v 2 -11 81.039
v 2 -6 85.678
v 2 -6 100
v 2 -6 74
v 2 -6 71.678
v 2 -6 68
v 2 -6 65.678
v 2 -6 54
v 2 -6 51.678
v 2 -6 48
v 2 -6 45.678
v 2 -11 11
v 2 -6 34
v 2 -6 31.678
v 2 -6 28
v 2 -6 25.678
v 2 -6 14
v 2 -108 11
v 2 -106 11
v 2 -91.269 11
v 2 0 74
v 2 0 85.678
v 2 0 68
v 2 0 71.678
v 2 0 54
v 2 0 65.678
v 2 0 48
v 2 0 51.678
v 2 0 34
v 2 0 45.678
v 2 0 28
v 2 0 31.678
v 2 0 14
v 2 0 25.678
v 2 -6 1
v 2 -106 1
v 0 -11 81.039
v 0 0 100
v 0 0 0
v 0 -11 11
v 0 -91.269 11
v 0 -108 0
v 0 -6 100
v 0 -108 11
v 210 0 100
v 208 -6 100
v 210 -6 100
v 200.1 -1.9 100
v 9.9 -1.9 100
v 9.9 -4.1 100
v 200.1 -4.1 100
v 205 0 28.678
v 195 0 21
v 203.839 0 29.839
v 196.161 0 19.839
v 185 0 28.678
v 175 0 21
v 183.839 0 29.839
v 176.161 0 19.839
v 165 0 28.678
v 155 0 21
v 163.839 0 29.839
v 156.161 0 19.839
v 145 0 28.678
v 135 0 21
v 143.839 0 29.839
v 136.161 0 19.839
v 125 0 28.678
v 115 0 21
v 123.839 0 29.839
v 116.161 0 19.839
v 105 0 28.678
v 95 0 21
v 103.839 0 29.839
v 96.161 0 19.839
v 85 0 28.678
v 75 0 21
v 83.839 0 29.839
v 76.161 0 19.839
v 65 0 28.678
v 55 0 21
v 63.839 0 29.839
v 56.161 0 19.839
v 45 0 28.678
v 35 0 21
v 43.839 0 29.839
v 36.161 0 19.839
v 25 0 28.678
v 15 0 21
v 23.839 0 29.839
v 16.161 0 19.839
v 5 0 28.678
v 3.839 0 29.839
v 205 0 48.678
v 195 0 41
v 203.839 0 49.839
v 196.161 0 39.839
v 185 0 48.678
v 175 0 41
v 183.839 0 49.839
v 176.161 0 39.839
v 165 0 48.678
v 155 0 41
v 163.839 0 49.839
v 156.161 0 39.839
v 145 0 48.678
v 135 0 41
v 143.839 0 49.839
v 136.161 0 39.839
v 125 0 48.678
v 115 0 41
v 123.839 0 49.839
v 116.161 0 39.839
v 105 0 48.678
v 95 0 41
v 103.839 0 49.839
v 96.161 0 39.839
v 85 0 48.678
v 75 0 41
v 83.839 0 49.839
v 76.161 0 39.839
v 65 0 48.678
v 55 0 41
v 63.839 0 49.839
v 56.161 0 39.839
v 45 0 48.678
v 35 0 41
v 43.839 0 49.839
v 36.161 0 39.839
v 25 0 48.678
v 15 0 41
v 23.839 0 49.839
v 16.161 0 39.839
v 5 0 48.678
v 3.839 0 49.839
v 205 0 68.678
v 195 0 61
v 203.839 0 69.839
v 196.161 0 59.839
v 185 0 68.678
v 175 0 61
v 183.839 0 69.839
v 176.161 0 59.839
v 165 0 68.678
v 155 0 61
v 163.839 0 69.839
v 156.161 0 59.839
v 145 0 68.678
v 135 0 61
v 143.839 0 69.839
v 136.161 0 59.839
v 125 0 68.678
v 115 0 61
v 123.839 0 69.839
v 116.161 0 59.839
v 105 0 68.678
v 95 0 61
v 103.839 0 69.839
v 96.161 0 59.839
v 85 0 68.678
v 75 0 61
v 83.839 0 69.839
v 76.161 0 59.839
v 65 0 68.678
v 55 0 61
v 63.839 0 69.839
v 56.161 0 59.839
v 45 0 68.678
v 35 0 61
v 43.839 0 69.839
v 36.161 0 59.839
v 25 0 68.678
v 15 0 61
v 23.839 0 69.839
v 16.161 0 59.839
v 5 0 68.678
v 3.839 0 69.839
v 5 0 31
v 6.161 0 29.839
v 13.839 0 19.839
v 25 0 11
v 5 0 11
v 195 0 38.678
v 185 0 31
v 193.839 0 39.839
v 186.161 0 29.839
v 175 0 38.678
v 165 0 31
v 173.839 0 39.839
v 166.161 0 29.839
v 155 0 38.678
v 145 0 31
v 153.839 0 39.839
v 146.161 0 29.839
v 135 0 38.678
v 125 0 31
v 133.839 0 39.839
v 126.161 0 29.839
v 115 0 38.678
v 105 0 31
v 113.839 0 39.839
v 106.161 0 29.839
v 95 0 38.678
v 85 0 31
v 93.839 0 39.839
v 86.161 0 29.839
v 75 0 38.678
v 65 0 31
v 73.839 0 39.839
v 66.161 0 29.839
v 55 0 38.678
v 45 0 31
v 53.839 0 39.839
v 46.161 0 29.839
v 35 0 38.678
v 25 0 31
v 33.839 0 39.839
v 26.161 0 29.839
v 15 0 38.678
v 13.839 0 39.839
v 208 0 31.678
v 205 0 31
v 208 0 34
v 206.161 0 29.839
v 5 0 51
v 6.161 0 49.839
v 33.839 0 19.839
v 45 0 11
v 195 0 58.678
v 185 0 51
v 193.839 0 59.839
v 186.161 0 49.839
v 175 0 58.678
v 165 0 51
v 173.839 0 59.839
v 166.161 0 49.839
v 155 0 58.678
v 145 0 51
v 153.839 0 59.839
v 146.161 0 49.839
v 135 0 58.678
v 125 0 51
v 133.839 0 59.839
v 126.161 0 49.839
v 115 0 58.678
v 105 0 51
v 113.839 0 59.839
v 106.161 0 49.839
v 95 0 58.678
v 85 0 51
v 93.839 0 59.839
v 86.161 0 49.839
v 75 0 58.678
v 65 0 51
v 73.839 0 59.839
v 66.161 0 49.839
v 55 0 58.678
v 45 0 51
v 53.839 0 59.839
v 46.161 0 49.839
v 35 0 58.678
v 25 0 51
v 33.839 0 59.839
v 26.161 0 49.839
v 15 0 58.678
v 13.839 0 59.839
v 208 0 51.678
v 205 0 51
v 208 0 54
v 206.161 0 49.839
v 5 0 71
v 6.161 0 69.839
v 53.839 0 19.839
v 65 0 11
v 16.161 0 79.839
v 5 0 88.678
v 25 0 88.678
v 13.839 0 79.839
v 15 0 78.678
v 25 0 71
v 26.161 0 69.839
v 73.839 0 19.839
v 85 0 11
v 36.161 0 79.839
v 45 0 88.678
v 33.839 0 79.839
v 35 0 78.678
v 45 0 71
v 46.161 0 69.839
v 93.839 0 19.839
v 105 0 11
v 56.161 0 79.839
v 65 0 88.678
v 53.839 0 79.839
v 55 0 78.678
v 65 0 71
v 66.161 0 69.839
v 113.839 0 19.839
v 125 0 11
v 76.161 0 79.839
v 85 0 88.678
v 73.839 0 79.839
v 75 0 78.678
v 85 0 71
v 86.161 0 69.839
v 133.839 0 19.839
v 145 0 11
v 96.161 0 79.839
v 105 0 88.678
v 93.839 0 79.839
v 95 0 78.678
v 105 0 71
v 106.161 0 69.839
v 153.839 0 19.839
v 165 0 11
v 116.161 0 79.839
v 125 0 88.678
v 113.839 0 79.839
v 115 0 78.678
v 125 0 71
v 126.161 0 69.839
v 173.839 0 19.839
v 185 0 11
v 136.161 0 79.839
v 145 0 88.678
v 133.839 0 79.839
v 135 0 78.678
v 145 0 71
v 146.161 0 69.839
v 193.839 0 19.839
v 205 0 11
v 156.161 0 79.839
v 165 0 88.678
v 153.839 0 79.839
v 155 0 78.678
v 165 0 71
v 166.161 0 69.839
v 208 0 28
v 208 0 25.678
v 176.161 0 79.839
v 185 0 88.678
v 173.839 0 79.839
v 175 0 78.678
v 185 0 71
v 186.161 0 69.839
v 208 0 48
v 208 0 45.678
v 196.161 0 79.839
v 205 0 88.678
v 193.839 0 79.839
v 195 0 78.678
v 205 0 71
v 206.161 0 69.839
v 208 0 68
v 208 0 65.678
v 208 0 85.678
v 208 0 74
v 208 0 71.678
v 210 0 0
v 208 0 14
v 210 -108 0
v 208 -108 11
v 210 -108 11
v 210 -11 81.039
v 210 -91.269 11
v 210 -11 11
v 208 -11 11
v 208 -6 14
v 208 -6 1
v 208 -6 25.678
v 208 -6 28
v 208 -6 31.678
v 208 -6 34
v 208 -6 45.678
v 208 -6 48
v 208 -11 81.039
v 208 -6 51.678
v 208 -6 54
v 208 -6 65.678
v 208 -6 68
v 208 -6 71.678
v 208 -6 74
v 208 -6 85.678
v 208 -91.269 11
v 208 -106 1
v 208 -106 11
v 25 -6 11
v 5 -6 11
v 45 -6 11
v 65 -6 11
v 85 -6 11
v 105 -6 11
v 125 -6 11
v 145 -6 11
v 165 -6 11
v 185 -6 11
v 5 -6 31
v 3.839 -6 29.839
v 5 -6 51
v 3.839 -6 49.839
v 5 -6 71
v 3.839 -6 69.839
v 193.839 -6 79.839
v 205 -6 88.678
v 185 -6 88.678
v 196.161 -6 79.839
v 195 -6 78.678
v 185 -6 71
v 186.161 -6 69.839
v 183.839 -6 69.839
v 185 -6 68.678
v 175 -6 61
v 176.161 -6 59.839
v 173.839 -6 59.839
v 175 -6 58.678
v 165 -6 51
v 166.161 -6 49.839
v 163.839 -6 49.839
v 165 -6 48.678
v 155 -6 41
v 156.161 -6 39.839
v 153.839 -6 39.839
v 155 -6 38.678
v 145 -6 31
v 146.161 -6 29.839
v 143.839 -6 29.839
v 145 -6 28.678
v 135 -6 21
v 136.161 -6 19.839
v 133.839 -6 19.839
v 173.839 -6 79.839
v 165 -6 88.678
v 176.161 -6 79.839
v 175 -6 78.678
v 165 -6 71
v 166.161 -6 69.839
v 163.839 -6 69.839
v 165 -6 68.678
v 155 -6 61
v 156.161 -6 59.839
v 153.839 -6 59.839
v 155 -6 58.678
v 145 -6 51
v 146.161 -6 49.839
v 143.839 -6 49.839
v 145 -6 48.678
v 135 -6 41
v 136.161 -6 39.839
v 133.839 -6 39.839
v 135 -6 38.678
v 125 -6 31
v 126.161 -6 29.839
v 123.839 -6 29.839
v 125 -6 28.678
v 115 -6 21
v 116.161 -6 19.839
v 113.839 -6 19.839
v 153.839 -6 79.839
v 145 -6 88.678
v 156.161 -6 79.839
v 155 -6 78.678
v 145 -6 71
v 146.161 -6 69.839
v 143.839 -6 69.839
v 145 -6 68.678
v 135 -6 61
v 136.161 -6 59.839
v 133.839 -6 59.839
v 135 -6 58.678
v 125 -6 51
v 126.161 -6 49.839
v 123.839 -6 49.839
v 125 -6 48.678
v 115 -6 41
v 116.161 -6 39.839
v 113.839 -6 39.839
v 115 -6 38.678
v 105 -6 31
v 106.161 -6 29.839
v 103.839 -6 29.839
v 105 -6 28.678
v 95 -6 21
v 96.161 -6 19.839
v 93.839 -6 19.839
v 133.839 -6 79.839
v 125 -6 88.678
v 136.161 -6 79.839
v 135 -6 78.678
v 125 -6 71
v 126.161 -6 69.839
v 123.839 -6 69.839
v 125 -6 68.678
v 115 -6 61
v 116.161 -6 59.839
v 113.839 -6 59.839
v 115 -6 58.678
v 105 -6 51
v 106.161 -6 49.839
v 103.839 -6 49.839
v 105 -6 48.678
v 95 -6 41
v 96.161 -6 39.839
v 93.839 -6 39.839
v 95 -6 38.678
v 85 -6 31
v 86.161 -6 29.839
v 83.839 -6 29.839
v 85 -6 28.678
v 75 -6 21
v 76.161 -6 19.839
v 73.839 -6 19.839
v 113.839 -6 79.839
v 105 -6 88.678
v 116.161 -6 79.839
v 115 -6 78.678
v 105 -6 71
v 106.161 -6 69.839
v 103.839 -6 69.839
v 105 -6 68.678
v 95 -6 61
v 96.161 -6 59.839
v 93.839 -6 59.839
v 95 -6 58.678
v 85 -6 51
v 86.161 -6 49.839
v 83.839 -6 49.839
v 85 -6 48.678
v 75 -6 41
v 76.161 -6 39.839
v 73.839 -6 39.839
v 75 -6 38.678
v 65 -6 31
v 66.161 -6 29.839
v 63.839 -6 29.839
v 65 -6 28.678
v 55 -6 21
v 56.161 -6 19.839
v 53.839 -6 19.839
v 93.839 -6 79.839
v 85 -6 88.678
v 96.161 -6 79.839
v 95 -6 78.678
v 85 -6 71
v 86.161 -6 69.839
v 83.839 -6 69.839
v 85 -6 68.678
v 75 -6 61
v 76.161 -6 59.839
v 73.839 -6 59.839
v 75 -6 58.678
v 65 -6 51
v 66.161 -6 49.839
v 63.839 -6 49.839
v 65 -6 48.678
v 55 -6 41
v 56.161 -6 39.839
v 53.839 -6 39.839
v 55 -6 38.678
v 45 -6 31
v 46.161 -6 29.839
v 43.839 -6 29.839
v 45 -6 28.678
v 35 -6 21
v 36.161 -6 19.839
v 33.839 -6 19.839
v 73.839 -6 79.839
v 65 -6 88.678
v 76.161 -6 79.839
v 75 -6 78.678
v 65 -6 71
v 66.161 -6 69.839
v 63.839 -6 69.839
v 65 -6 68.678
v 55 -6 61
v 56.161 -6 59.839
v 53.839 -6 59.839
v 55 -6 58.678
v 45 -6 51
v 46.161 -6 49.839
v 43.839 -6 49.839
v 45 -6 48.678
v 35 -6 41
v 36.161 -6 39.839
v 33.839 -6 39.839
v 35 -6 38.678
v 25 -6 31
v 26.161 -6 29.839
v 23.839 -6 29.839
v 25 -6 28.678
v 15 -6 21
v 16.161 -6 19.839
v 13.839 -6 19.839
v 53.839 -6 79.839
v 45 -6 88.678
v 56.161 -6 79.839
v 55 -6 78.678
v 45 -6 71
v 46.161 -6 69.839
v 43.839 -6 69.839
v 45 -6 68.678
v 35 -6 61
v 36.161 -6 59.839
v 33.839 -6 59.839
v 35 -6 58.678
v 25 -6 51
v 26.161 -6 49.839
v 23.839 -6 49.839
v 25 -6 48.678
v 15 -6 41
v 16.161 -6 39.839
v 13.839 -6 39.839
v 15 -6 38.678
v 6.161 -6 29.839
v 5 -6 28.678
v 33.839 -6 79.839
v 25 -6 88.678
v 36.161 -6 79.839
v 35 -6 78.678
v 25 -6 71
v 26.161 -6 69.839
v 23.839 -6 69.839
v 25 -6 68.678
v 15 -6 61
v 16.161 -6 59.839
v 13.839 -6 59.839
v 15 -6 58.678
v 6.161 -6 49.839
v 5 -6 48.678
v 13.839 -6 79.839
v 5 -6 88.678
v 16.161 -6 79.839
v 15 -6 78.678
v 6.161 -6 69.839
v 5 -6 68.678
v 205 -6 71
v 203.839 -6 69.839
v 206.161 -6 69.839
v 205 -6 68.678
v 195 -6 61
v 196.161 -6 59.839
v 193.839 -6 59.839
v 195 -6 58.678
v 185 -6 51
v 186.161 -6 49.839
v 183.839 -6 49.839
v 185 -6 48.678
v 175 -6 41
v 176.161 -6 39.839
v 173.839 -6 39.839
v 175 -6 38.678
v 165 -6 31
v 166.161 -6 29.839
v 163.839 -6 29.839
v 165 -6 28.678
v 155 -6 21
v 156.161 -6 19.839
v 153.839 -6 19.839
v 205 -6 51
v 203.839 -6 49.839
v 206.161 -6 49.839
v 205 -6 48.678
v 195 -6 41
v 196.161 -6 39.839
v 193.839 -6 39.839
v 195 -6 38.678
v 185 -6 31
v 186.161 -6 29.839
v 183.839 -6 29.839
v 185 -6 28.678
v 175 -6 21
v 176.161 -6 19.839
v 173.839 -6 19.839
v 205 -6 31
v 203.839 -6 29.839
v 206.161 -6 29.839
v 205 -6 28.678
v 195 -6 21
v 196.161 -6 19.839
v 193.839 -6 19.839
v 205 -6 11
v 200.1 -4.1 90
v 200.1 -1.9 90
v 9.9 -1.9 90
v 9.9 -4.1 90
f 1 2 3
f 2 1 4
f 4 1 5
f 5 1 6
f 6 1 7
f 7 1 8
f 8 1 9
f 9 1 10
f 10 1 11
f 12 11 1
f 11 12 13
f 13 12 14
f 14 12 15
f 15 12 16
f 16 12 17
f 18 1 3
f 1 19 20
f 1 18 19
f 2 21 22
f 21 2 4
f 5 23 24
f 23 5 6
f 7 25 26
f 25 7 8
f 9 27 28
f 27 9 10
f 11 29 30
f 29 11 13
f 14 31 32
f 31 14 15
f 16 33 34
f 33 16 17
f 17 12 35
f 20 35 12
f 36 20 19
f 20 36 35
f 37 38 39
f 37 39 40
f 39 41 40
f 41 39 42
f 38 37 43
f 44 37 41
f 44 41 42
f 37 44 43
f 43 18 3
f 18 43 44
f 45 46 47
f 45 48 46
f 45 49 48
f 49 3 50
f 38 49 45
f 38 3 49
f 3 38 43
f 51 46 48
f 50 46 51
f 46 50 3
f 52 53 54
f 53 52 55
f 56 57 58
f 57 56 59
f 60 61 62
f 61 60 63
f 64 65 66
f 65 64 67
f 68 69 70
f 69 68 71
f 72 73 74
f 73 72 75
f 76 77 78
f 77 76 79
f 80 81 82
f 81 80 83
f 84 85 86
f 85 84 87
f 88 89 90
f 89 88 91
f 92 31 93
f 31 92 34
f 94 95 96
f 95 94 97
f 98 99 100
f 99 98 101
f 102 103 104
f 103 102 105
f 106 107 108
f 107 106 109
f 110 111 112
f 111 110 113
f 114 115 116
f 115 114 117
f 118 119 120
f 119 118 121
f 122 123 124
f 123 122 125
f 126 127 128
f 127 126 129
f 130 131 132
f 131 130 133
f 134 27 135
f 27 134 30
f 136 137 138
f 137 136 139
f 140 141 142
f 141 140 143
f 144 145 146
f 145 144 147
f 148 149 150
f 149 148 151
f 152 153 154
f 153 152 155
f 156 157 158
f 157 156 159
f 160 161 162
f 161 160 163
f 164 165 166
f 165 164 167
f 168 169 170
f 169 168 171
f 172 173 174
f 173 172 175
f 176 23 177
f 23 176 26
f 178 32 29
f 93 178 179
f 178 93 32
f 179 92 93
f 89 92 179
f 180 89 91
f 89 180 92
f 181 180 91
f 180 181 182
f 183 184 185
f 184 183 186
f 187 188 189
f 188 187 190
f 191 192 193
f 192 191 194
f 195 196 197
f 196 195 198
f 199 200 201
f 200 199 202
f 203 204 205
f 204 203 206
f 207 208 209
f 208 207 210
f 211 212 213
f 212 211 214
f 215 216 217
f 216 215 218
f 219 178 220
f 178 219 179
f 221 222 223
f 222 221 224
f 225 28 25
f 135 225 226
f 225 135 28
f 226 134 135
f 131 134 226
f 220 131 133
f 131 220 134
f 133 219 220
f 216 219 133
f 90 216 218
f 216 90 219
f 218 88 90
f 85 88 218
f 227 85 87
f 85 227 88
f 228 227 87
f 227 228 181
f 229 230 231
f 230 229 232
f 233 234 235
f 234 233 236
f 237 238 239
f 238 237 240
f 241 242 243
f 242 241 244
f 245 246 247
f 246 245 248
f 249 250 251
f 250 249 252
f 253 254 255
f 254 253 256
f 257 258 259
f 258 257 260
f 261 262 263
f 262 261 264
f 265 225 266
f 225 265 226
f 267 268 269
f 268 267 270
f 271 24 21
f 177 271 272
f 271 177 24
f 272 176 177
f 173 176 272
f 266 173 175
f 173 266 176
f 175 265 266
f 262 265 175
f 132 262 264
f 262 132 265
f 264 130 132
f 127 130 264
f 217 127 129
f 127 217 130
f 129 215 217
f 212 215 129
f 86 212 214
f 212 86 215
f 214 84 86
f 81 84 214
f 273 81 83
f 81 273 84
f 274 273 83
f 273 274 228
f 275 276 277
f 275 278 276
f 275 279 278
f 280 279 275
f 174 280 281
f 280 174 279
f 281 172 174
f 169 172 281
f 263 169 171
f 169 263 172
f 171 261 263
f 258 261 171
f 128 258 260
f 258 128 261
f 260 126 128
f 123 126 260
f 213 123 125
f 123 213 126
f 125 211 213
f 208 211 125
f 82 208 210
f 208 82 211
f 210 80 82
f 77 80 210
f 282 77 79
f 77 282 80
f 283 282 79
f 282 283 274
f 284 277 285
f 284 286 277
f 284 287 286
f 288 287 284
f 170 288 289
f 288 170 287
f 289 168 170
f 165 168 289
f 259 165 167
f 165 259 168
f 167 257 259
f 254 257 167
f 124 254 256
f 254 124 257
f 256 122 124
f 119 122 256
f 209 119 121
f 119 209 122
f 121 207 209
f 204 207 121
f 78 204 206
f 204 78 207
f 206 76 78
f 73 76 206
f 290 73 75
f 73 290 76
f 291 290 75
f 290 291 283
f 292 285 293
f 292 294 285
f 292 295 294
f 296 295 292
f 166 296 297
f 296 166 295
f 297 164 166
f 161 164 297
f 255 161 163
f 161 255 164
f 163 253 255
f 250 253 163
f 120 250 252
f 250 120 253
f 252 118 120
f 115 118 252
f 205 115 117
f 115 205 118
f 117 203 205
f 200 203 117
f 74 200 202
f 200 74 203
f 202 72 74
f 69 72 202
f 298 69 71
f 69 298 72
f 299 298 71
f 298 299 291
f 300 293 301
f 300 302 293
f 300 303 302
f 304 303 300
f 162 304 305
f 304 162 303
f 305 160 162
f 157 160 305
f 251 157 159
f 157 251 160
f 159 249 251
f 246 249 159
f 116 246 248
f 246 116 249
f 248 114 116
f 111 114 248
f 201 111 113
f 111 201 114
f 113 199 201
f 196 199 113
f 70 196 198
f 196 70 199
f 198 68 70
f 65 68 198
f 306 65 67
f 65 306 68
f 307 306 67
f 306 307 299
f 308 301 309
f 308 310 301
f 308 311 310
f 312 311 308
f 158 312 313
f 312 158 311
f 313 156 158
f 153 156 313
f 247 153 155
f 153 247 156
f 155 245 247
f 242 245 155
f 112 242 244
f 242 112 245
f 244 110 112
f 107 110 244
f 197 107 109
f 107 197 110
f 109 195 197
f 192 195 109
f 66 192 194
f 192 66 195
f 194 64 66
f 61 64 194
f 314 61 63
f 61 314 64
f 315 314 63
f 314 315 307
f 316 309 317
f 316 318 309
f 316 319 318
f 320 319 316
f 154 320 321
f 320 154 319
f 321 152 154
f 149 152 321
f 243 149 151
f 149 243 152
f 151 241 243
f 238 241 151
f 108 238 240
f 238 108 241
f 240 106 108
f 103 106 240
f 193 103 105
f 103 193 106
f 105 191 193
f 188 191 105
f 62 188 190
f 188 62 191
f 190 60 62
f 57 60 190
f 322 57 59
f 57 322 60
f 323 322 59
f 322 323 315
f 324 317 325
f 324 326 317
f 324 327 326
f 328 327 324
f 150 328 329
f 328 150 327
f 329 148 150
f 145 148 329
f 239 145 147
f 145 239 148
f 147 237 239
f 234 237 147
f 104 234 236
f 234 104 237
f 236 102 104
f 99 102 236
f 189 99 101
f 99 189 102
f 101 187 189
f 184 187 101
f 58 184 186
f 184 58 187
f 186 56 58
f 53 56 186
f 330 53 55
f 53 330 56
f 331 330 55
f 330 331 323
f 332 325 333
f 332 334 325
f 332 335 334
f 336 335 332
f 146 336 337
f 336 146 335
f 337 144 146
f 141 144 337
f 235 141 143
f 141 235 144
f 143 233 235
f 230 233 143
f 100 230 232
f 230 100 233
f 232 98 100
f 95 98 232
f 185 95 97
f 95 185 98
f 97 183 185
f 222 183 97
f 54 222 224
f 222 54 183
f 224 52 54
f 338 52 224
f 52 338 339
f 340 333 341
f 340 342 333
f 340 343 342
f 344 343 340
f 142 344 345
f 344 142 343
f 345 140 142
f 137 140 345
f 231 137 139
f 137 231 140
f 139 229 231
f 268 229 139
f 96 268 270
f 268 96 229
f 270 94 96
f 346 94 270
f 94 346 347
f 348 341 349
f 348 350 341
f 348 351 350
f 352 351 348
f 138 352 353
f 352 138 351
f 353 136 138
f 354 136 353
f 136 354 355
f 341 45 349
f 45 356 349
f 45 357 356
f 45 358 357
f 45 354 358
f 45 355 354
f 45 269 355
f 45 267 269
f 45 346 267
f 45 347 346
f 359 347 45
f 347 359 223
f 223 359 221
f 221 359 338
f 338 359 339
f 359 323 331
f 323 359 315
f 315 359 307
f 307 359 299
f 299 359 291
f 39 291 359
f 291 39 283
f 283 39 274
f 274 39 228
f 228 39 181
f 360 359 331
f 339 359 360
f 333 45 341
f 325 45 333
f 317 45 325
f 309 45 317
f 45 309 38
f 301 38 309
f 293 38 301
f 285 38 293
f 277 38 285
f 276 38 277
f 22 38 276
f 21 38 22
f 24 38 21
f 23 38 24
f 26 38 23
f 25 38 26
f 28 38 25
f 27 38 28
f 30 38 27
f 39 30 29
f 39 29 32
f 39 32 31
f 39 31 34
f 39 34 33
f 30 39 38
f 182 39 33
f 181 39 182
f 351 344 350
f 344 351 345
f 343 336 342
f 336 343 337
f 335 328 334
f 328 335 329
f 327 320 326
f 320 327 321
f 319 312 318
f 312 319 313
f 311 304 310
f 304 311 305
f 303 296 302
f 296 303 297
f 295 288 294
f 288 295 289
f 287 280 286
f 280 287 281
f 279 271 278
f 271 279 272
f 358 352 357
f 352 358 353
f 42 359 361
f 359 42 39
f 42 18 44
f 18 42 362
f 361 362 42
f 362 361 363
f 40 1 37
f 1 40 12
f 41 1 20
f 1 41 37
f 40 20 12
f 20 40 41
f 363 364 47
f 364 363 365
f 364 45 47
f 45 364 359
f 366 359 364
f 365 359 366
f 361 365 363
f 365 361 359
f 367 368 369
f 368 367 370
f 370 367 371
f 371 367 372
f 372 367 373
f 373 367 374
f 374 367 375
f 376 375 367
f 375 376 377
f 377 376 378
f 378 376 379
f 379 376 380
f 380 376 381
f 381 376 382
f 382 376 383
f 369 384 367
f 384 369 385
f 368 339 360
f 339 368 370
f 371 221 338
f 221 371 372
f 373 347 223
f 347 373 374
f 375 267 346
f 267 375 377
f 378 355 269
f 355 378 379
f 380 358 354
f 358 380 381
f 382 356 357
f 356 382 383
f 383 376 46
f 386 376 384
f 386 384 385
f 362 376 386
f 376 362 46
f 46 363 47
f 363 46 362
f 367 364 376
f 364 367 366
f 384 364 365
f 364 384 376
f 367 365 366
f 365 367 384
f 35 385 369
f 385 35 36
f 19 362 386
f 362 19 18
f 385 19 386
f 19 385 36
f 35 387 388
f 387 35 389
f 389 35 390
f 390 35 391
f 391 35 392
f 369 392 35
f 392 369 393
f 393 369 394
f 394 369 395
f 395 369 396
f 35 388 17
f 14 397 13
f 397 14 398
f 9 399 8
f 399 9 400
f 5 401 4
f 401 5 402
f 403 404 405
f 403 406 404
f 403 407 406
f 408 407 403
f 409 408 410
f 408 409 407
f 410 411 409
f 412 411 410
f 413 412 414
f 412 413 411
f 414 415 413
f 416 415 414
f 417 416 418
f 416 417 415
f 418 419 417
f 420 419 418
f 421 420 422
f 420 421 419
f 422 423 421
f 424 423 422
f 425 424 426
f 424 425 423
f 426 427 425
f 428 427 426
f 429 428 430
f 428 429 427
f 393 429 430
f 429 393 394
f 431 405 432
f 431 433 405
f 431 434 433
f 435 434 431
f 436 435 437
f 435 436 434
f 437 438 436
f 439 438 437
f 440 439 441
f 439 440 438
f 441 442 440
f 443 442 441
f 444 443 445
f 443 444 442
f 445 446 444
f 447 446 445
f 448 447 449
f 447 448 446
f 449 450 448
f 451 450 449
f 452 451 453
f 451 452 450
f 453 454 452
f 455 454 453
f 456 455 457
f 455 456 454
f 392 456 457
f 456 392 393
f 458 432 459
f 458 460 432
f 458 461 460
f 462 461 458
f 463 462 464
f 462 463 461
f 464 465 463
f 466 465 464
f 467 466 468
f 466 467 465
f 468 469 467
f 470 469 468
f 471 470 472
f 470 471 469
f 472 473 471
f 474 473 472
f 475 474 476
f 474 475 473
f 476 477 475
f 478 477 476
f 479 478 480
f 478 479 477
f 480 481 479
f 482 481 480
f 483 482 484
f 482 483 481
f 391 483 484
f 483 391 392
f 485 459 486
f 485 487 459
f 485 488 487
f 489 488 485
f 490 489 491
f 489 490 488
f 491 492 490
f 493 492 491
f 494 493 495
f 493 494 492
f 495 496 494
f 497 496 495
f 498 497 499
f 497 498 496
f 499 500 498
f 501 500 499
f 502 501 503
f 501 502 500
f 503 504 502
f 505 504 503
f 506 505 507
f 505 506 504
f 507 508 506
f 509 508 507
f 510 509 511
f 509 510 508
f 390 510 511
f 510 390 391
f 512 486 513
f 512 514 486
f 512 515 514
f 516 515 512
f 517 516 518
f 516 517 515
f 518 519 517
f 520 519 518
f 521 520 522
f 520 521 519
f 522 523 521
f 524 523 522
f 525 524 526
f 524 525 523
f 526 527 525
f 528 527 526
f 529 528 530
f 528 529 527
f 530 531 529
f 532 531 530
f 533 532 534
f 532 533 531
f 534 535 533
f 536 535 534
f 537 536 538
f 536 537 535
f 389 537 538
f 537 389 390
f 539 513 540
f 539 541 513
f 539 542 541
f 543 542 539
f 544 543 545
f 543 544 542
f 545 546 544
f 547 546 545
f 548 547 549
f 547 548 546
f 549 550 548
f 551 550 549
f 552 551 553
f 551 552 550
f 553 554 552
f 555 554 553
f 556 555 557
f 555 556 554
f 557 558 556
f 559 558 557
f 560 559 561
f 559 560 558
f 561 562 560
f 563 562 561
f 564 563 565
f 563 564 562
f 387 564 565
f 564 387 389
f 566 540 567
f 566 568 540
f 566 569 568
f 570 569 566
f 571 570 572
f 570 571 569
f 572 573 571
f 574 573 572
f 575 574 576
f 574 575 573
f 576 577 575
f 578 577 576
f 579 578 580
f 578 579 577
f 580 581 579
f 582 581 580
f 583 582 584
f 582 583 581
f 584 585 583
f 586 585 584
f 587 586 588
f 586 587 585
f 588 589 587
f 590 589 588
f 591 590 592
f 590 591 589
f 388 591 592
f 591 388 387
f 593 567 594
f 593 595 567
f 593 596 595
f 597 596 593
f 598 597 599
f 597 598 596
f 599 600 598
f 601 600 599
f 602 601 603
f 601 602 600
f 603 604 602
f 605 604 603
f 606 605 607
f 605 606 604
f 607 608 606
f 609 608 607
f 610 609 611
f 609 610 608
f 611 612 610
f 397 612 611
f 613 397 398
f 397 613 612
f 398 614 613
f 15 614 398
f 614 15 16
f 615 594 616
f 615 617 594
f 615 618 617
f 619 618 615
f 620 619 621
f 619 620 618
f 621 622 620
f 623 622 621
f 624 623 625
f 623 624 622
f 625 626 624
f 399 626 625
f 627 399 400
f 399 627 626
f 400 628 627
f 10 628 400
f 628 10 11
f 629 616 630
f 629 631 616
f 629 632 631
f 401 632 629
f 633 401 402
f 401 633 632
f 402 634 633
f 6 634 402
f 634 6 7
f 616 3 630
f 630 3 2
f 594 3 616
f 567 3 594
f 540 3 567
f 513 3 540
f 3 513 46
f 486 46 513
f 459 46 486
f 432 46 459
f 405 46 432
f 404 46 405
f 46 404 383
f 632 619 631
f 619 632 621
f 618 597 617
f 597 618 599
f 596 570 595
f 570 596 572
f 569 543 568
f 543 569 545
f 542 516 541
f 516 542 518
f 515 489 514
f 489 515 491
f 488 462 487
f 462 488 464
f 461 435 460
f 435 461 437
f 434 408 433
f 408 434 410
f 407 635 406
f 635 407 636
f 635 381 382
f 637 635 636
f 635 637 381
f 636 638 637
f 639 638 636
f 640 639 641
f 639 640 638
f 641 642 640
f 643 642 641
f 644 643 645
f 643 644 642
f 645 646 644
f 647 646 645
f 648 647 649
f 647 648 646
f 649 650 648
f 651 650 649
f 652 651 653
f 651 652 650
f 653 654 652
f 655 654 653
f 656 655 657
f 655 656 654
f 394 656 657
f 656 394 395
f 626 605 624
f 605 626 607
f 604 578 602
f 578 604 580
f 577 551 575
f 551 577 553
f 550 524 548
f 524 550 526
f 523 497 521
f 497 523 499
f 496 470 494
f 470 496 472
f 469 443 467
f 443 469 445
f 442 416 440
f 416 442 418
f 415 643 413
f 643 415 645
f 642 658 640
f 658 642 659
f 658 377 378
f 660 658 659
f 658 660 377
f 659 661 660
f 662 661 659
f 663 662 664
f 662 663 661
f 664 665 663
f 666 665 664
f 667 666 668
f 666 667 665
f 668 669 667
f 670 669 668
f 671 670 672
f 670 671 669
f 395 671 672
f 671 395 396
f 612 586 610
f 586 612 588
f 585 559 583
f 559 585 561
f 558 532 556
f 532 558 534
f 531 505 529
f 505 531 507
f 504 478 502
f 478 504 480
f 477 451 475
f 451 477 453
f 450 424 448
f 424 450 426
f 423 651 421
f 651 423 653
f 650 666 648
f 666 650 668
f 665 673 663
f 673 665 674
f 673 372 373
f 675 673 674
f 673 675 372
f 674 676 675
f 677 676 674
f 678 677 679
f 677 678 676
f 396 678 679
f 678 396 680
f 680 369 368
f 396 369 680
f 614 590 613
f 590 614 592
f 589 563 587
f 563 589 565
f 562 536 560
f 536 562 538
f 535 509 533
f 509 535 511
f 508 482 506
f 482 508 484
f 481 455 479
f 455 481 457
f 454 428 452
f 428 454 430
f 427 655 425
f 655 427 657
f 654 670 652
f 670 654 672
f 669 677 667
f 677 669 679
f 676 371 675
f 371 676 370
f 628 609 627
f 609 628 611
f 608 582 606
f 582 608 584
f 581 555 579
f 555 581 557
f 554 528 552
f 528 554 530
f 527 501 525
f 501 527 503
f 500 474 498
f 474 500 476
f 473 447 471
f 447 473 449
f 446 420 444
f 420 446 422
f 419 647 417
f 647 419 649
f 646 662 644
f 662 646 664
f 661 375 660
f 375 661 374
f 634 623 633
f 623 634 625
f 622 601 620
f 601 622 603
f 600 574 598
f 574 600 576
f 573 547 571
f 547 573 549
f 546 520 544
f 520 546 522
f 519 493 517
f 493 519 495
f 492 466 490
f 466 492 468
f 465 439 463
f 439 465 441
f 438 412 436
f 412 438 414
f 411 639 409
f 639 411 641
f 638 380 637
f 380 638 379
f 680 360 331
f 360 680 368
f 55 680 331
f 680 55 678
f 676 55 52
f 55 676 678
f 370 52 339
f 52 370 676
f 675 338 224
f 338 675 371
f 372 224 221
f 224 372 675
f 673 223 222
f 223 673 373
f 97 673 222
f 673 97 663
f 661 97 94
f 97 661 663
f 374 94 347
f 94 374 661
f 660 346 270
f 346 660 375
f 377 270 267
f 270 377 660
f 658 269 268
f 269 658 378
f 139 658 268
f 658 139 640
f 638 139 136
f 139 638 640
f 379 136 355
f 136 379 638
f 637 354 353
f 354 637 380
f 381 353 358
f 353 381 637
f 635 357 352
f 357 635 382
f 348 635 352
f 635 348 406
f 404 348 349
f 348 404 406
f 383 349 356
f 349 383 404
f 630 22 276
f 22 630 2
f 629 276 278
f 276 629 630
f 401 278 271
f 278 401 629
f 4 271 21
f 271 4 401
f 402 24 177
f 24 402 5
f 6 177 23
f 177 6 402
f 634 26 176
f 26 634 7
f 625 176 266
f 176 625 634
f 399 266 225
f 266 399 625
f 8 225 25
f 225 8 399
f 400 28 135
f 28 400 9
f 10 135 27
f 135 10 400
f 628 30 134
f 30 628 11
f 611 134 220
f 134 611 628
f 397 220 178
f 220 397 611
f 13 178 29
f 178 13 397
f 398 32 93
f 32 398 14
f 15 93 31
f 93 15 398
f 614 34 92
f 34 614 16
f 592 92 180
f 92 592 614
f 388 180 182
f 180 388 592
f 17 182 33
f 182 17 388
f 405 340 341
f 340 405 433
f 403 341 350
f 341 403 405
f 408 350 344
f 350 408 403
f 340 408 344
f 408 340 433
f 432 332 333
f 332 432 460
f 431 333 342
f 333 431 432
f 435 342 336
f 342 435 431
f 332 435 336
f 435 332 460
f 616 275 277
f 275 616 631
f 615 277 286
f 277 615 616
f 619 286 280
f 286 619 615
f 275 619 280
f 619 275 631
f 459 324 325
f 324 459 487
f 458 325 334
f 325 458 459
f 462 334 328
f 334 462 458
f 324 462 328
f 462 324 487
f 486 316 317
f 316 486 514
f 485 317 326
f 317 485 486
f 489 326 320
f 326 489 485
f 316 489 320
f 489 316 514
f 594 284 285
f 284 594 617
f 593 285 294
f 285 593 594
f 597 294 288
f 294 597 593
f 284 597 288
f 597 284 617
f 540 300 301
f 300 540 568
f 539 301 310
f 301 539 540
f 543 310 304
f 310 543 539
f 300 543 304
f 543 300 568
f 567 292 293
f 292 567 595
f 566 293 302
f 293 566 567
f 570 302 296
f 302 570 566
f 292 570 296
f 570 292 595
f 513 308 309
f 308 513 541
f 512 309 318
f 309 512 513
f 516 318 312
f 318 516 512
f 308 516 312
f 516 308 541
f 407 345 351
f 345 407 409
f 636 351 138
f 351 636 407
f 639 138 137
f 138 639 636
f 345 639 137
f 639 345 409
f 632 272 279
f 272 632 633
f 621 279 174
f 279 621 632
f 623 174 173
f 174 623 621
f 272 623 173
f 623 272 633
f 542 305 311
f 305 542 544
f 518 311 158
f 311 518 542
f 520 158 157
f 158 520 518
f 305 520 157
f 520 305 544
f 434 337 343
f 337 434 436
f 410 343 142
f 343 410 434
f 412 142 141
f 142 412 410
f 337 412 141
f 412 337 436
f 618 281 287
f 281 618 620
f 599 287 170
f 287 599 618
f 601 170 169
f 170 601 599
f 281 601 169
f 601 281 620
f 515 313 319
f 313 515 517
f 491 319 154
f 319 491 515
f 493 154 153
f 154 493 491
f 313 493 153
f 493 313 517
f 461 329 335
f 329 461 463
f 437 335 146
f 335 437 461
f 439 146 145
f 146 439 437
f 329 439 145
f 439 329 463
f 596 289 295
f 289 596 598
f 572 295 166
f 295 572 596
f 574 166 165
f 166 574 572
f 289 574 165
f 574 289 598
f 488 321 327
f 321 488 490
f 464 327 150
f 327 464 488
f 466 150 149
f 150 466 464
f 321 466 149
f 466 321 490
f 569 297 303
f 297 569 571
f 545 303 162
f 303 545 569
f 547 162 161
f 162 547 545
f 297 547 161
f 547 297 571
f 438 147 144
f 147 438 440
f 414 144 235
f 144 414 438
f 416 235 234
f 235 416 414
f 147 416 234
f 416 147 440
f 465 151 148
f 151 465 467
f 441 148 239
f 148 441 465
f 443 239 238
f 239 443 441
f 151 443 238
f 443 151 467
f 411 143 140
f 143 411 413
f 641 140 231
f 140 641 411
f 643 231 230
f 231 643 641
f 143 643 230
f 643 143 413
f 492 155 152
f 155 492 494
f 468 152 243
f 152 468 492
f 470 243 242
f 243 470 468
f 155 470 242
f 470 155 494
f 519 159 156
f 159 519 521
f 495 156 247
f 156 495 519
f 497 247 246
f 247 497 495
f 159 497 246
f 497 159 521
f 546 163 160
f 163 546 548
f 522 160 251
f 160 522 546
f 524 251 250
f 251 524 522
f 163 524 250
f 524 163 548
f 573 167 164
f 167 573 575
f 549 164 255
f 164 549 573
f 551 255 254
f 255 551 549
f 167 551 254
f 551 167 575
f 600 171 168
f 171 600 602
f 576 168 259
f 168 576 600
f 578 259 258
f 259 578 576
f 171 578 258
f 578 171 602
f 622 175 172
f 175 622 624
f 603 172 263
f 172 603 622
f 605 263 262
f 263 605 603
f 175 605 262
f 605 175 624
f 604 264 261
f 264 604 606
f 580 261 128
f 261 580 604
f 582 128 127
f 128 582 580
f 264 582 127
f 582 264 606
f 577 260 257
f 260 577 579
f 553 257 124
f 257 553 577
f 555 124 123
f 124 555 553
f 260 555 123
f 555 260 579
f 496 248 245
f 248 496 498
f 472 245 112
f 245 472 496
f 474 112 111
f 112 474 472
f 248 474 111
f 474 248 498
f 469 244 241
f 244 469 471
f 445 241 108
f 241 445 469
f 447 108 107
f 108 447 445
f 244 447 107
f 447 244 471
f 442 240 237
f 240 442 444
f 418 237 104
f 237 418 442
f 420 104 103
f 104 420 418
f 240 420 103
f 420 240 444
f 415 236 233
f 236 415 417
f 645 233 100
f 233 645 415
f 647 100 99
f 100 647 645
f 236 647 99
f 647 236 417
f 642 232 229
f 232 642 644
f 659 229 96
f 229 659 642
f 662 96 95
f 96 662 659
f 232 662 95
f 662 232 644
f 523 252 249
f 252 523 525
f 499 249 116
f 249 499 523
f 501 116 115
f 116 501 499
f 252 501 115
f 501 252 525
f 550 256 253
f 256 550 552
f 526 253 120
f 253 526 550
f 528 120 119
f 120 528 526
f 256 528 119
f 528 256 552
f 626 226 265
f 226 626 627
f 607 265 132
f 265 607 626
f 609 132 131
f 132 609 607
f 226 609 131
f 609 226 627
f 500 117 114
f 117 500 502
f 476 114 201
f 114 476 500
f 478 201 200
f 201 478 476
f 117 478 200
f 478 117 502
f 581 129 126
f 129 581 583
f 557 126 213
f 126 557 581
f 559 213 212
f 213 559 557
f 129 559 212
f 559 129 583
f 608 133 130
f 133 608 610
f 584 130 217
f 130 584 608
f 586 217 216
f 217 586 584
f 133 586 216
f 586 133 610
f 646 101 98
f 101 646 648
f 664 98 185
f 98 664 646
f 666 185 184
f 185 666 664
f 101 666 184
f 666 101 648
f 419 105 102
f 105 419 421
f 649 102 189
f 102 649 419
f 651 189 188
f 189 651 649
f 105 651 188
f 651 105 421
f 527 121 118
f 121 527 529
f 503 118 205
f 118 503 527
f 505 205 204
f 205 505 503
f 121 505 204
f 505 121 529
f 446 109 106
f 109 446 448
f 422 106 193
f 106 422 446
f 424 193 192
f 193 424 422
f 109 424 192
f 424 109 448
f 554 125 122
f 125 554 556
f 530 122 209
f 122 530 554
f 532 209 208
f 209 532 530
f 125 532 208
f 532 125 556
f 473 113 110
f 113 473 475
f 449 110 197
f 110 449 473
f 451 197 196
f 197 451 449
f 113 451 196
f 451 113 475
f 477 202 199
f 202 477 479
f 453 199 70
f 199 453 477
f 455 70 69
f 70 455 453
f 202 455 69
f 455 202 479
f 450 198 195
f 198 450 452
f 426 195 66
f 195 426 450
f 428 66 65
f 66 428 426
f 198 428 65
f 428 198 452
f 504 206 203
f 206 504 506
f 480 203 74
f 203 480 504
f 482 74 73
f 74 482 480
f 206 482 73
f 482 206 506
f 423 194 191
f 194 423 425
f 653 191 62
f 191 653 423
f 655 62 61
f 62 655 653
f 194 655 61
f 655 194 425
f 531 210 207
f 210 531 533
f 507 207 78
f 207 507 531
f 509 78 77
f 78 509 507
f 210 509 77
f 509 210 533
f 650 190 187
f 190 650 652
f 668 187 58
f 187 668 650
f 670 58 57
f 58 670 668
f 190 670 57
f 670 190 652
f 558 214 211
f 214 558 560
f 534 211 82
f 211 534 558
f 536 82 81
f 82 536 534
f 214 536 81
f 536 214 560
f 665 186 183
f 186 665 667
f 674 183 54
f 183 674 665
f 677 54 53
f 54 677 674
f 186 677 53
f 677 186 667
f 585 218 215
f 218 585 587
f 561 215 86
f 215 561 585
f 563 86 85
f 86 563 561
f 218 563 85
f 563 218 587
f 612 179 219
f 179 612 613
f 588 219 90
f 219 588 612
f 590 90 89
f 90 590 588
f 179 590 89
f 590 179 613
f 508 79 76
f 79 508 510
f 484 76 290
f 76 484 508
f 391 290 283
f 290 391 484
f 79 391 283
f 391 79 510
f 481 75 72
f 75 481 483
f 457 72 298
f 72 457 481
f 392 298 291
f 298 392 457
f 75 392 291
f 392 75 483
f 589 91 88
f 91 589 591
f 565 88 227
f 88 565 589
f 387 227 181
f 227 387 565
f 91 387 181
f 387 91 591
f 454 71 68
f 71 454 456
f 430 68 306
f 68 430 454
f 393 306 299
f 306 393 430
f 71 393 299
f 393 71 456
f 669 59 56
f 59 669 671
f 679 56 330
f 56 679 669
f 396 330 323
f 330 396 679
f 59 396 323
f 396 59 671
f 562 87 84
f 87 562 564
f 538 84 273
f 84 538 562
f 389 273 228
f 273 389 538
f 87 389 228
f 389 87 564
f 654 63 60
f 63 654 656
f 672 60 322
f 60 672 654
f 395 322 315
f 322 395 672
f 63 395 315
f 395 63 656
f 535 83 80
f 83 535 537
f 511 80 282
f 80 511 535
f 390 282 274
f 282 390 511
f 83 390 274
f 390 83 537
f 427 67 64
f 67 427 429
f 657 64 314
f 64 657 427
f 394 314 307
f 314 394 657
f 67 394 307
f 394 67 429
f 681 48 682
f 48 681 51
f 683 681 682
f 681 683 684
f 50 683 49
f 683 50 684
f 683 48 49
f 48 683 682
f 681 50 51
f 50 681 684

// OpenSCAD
// minimum angle for a fragment
$fa=1;
// minimum size of a fragment
$fs=0.2;

tol=0.1;
part="stand"; // ["stand", "backplane", "clip"]

module backplane() for(e=[2, 4]) linear_extrude(e) difference() {
    union() {
        hull() for(i=[10, 200]) {
            translate([i, 240]) circle(r=10);
            translate([i, 20]) square(20, center=true);
        }
        if(e==2) translate([10, 0]) square([190,10]);
    }
    for(k=[30, 145]) hull() for(i=[20, 190], j=[0, 85])
        translate([i, j+k]) circle(r=10);
    if(e==4) for(i=[25:10:185]) translate([i, 150])
        square([4, 300], center=true);
    for(i=[25:10:185], j=[10, 20, 125, 135, 240, 250]) translate([i, j])
        square(4, center=true);
}

module clip() linear_extrude(4-2*tol, center=true) polygon([
    [0, 0],
    [15-tol, 0],
    [15-tol, 2-tol],
    [14-tol, 2-tol],
    [14-tol, 8+tol],
    [16+tol, 8+tol],
    [16+tol, 2-tol],
    [15+tol, 2-tol],
    [15+tol, 0],
    [18, 0],
    [18, 10],
    [12, 10],
    [12, 2],
    [2, 2],
    [2, 10],
    [0, 10],
]);

module sideprof()
    polygon([[0, 0], [108, 0], [108, 11], [6, 100], [0, 100]]);

module stand() difference() {
    union() {
        for(i=[2, 210]) translate([i, 0, 0]) rotate([90, 0, -90])
            linear_extrude(2) difference() {
                sideprof();
                offset(r=-11) sideprof();
            }
        mirror([0, 1, 0]) {
            cube([210, 108, 1]);
            //cube([210, 6, 100]);
            translate([0, 106, 0]) cube([210, 2, 11]);
        }
        rotate([90, 0, 0]) linear_extrude(6, convexity=10)
            difference() {
                square([210, 100]);
                for(i=[5:20:205], j=[11:20:75])
                translate([i, j]) rotate(45) square(12.5);
                for(i=[-5:20:215], j=[21:20:75])
                translate([i, j]) rotate(45) square(12.5);
        }
    }
    translate([210/2, -3, 100]) cube([190+2*tol, 2+2*tol, 20], center=true);
}

if($preview) {
    color("white") 
    translate([0, -2, 90])
    rotate([90, 0, 0]) backplane();
    color("darkgrey") {
    for(i=[25:10:185], j=[100:115:330])
    translate([i, -18, j])
    rotate([90, 0, 90]) clip();
    stand();
}
} else
    if(part == "stand")
        stand();
    else if(part == "clip")
        //for(i=[10:19:190], j=[1:13:30])
        //translate([i, j, 2-tol])
        clip();
    else
        mirror([1, 0, 0]) rotate(90) backplane();
